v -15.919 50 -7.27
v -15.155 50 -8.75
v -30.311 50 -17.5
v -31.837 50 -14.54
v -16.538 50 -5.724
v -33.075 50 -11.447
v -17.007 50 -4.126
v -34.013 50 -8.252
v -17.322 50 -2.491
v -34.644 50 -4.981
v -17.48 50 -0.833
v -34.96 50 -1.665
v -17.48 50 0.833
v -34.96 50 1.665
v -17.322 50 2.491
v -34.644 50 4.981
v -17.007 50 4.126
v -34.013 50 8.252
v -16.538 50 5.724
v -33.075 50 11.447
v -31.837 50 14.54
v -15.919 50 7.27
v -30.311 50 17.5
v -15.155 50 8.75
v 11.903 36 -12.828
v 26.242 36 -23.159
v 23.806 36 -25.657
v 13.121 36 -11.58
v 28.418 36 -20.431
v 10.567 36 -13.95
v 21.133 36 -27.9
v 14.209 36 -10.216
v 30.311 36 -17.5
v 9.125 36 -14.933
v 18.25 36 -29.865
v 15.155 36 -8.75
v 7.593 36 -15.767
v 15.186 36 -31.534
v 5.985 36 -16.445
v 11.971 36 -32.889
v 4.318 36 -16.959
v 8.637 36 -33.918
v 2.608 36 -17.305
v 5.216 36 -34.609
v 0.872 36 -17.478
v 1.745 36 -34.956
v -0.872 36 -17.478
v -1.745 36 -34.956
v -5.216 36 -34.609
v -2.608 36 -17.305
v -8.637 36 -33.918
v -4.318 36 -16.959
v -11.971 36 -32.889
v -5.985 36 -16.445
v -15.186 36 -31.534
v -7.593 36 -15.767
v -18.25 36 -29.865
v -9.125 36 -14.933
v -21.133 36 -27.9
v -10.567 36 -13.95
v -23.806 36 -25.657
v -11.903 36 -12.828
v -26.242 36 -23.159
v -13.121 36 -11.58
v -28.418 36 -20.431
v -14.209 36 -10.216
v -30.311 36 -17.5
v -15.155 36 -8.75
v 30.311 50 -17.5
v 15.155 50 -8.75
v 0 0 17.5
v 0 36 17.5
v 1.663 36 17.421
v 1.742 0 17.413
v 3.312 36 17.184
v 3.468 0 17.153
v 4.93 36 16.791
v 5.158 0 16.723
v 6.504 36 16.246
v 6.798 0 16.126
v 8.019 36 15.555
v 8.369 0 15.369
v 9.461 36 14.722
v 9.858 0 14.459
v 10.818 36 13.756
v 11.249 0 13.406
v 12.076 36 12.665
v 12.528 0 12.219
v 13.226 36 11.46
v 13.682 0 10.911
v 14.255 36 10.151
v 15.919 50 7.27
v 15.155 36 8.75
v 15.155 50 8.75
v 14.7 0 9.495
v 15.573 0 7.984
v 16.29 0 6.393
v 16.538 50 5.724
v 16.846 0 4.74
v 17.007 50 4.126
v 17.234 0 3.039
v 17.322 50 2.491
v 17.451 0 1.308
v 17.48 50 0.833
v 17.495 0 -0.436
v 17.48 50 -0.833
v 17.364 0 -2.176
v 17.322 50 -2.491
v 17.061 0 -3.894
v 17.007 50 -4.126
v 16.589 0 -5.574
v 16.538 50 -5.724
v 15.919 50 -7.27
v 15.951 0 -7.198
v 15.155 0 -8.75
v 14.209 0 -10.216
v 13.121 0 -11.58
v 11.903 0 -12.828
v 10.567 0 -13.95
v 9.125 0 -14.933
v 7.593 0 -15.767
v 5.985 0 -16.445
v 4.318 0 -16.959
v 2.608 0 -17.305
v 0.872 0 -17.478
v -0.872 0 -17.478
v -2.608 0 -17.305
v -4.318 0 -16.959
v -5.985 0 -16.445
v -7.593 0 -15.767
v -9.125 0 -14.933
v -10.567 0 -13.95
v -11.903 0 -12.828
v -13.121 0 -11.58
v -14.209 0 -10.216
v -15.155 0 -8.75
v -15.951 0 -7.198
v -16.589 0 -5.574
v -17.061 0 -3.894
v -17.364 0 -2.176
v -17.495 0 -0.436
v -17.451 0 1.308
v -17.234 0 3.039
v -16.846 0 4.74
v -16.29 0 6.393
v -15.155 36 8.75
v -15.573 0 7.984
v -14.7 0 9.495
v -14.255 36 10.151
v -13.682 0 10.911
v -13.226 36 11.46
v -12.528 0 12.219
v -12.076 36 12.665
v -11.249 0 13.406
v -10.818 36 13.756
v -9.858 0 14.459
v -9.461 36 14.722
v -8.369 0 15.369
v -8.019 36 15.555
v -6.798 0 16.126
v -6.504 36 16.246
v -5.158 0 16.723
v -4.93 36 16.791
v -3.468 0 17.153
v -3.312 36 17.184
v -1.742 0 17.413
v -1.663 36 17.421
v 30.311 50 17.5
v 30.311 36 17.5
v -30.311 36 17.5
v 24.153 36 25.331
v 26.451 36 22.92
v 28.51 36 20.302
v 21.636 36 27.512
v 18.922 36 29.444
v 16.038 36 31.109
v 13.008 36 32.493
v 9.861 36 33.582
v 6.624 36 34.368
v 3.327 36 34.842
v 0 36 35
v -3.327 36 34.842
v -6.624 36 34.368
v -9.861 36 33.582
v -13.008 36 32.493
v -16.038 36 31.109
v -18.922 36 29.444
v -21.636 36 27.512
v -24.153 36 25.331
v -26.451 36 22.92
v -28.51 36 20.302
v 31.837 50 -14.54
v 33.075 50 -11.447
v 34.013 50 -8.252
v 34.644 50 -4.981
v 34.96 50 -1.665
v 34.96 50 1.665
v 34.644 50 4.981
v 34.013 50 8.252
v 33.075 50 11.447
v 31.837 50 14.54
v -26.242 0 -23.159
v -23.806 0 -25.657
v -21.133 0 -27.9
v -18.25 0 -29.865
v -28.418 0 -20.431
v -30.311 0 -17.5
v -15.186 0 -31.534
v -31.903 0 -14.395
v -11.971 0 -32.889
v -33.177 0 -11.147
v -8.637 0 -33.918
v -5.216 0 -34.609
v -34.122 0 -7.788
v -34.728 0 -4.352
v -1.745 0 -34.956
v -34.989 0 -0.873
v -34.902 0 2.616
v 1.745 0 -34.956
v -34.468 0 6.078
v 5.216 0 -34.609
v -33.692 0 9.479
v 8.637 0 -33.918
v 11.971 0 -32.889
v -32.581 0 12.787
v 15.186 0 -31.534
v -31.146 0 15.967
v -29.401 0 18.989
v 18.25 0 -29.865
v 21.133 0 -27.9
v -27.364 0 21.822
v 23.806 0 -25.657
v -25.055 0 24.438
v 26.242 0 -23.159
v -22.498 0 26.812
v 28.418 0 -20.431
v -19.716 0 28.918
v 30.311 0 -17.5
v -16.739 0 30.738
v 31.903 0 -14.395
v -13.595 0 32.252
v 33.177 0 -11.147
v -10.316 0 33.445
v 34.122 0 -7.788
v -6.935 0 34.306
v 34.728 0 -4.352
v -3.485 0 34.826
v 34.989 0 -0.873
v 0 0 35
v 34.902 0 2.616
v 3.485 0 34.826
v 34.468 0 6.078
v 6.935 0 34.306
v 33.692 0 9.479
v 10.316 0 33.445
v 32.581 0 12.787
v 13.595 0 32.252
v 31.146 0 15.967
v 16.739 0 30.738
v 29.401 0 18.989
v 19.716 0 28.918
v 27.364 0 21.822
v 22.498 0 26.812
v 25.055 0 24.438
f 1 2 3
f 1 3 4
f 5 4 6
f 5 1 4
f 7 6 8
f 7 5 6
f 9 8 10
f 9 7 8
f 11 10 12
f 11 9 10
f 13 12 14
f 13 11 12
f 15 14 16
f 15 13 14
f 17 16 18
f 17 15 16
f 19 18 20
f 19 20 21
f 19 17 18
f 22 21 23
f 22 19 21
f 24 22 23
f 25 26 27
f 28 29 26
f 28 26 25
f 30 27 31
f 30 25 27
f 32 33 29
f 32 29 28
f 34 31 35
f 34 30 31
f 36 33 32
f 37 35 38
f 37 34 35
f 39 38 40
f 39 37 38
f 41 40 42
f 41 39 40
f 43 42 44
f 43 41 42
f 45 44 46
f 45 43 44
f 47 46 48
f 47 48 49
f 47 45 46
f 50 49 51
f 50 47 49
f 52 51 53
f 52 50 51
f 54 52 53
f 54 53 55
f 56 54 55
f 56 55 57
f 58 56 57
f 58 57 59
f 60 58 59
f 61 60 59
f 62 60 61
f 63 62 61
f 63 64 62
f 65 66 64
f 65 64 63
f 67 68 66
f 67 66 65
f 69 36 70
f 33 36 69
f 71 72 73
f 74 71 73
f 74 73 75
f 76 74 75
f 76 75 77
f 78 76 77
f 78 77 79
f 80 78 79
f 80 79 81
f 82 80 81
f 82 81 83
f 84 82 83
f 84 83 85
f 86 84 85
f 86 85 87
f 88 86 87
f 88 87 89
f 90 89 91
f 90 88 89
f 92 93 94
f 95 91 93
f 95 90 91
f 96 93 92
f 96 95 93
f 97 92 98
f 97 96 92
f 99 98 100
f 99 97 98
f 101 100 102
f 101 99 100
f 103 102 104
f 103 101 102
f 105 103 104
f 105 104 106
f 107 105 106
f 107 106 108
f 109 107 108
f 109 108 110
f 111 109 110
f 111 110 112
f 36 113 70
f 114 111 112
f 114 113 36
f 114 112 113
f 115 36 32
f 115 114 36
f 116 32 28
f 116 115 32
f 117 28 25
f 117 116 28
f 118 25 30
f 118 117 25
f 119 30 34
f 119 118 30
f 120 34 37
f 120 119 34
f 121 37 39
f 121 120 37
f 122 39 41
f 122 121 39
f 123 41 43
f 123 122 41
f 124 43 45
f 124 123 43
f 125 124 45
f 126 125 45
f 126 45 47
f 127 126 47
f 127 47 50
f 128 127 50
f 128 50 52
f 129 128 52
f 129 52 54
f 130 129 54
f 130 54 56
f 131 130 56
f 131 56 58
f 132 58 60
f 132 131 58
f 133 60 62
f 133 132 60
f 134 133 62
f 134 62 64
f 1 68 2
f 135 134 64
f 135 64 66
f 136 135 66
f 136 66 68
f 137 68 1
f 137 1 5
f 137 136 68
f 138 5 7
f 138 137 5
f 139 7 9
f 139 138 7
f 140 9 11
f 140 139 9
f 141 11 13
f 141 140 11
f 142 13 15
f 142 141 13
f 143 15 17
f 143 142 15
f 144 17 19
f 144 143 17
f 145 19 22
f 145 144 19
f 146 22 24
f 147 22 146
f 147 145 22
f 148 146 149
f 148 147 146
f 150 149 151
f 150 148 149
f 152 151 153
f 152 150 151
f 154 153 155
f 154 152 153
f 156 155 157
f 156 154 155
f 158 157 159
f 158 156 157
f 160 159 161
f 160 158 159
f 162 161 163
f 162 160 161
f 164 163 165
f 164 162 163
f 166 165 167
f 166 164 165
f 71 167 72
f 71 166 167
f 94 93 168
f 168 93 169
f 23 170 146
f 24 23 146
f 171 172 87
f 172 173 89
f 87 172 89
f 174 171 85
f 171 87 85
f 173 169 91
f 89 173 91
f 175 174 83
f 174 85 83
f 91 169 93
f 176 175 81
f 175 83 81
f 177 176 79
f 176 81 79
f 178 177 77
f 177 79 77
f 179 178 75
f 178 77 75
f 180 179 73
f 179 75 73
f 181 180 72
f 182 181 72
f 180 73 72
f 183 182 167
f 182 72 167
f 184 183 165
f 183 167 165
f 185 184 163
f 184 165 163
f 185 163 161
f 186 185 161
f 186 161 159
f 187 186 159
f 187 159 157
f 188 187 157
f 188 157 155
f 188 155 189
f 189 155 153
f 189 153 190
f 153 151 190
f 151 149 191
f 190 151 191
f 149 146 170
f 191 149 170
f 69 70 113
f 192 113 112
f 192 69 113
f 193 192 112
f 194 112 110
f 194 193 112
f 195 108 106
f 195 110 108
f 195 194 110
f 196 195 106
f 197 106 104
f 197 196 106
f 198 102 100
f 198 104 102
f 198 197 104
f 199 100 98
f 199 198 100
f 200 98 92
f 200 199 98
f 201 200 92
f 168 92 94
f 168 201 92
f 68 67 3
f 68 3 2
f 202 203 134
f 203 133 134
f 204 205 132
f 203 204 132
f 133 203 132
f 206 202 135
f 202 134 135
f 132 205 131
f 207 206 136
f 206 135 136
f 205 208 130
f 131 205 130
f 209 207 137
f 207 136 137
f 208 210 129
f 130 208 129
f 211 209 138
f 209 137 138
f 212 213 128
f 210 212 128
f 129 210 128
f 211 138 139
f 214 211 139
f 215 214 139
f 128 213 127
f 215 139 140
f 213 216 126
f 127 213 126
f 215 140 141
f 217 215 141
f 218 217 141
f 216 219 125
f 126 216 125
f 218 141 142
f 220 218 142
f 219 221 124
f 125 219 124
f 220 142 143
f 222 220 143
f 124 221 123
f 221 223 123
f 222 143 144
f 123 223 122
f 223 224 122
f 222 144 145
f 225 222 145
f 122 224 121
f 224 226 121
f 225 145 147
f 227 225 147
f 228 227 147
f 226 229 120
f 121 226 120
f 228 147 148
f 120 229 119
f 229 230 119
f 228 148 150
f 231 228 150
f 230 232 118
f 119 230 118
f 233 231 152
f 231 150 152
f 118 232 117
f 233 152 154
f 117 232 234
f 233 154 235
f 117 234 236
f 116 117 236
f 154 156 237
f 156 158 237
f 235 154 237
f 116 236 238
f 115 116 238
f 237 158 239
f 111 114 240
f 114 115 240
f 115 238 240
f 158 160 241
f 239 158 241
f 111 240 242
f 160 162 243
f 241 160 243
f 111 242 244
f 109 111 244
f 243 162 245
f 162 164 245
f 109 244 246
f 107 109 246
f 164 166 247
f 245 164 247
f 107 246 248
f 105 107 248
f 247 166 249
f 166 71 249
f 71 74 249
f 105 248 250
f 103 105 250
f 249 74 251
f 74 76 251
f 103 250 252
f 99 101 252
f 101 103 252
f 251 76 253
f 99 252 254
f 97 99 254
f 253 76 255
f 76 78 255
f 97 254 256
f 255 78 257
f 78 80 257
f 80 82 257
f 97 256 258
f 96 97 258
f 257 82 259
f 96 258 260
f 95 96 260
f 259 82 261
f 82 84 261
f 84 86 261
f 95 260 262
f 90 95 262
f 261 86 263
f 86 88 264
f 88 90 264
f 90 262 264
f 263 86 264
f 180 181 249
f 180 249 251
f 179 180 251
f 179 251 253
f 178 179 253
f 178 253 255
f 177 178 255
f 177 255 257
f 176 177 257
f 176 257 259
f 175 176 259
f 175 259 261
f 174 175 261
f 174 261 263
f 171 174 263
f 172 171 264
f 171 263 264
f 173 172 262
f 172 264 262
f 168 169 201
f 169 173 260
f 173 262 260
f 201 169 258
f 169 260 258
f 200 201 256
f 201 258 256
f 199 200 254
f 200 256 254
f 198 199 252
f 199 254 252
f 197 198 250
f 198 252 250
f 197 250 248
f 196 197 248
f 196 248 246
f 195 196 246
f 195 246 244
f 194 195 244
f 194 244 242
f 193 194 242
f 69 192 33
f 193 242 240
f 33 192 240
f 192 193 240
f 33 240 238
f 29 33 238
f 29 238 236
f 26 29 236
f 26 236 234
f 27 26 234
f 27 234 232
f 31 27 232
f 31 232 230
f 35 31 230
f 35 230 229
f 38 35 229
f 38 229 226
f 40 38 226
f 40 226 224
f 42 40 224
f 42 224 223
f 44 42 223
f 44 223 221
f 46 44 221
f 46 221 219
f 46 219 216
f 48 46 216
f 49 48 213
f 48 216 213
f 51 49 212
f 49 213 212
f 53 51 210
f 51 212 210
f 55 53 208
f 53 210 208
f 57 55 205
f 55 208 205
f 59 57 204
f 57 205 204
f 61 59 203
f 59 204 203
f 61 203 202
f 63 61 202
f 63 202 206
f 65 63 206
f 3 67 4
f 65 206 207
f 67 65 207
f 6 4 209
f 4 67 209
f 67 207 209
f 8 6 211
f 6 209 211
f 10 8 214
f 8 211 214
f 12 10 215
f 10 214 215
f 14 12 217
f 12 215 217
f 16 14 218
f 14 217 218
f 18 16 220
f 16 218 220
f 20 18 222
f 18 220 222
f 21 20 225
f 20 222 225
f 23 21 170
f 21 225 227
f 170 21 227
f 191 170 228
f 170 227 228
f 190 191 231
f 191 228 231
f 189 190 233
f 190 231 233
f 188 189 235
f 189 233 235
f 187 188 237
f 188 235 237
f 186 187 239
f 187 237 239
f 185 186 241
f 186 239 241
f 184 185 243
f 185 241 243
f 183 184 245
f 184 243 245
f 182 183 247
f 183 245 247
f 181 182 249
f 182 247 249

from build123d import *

# Parameters (mm, degrees)
SKETCH1_R           = 35
SKETCH1_R_2         = 17.5
BOSS_EXTRUDE1_DEPTH = 50
CUT_EXTRUDE1_START  = -14
CUT_EXTRUDE1_DEPTH  = 14


with BuildPart() as part:
    # Sketch1 → Boss-Extrude1 (new body)
    with BuildSketch(Plane(origin=(0, 0, 0), x_dir=(1, 0, 0), z_dir=(0, 1, 0))):
        with Locations(Location((0, 0, 0), (0, 0, 270))):
            Circle(SKETCH1_R)
        with Locations(Location((0, 0, 0), (0, 0, 270))):
            Circle(SKETCH1_R_2, mode=Mode.SUBTRACT)
    extrude(amount=BOSS_EXTRUDE1_DEPTH)

    # Sketch2 → Cut-Extrude1 (cut)
    with BuildSketch(Plane(origin=(0, 50, 0), x_dir=(1, 0, 0), z_dir=(0, 1, 0)).offset(CUT_EXTRUDE1_START)):
        with BuildLine():
            Line((15.155444566, -8.75), (30.310889132, -17.5))
            ThreePointArc((30.310889132, -17.5), (0, -35), (-30.310889132, -17.5))
            Line((-30.310889132, -17.5), (-15.155444566, -8.75))
            ThreePointArc((-15.155444566, -8.75), (0, -17.5), (15.155444566, -8.75))
        make_face()
    cut_extrude1 = extrude(amount=CUT_EXTRUDE1_DEPTH, mode=Mode.SUBTRACT)

    # Mirror1: Cut-Extrude1 across plane
    add(cut_extrude1.mirror(Plane.XY), mode=Mode.SUBTRACT)


solid = part.part
